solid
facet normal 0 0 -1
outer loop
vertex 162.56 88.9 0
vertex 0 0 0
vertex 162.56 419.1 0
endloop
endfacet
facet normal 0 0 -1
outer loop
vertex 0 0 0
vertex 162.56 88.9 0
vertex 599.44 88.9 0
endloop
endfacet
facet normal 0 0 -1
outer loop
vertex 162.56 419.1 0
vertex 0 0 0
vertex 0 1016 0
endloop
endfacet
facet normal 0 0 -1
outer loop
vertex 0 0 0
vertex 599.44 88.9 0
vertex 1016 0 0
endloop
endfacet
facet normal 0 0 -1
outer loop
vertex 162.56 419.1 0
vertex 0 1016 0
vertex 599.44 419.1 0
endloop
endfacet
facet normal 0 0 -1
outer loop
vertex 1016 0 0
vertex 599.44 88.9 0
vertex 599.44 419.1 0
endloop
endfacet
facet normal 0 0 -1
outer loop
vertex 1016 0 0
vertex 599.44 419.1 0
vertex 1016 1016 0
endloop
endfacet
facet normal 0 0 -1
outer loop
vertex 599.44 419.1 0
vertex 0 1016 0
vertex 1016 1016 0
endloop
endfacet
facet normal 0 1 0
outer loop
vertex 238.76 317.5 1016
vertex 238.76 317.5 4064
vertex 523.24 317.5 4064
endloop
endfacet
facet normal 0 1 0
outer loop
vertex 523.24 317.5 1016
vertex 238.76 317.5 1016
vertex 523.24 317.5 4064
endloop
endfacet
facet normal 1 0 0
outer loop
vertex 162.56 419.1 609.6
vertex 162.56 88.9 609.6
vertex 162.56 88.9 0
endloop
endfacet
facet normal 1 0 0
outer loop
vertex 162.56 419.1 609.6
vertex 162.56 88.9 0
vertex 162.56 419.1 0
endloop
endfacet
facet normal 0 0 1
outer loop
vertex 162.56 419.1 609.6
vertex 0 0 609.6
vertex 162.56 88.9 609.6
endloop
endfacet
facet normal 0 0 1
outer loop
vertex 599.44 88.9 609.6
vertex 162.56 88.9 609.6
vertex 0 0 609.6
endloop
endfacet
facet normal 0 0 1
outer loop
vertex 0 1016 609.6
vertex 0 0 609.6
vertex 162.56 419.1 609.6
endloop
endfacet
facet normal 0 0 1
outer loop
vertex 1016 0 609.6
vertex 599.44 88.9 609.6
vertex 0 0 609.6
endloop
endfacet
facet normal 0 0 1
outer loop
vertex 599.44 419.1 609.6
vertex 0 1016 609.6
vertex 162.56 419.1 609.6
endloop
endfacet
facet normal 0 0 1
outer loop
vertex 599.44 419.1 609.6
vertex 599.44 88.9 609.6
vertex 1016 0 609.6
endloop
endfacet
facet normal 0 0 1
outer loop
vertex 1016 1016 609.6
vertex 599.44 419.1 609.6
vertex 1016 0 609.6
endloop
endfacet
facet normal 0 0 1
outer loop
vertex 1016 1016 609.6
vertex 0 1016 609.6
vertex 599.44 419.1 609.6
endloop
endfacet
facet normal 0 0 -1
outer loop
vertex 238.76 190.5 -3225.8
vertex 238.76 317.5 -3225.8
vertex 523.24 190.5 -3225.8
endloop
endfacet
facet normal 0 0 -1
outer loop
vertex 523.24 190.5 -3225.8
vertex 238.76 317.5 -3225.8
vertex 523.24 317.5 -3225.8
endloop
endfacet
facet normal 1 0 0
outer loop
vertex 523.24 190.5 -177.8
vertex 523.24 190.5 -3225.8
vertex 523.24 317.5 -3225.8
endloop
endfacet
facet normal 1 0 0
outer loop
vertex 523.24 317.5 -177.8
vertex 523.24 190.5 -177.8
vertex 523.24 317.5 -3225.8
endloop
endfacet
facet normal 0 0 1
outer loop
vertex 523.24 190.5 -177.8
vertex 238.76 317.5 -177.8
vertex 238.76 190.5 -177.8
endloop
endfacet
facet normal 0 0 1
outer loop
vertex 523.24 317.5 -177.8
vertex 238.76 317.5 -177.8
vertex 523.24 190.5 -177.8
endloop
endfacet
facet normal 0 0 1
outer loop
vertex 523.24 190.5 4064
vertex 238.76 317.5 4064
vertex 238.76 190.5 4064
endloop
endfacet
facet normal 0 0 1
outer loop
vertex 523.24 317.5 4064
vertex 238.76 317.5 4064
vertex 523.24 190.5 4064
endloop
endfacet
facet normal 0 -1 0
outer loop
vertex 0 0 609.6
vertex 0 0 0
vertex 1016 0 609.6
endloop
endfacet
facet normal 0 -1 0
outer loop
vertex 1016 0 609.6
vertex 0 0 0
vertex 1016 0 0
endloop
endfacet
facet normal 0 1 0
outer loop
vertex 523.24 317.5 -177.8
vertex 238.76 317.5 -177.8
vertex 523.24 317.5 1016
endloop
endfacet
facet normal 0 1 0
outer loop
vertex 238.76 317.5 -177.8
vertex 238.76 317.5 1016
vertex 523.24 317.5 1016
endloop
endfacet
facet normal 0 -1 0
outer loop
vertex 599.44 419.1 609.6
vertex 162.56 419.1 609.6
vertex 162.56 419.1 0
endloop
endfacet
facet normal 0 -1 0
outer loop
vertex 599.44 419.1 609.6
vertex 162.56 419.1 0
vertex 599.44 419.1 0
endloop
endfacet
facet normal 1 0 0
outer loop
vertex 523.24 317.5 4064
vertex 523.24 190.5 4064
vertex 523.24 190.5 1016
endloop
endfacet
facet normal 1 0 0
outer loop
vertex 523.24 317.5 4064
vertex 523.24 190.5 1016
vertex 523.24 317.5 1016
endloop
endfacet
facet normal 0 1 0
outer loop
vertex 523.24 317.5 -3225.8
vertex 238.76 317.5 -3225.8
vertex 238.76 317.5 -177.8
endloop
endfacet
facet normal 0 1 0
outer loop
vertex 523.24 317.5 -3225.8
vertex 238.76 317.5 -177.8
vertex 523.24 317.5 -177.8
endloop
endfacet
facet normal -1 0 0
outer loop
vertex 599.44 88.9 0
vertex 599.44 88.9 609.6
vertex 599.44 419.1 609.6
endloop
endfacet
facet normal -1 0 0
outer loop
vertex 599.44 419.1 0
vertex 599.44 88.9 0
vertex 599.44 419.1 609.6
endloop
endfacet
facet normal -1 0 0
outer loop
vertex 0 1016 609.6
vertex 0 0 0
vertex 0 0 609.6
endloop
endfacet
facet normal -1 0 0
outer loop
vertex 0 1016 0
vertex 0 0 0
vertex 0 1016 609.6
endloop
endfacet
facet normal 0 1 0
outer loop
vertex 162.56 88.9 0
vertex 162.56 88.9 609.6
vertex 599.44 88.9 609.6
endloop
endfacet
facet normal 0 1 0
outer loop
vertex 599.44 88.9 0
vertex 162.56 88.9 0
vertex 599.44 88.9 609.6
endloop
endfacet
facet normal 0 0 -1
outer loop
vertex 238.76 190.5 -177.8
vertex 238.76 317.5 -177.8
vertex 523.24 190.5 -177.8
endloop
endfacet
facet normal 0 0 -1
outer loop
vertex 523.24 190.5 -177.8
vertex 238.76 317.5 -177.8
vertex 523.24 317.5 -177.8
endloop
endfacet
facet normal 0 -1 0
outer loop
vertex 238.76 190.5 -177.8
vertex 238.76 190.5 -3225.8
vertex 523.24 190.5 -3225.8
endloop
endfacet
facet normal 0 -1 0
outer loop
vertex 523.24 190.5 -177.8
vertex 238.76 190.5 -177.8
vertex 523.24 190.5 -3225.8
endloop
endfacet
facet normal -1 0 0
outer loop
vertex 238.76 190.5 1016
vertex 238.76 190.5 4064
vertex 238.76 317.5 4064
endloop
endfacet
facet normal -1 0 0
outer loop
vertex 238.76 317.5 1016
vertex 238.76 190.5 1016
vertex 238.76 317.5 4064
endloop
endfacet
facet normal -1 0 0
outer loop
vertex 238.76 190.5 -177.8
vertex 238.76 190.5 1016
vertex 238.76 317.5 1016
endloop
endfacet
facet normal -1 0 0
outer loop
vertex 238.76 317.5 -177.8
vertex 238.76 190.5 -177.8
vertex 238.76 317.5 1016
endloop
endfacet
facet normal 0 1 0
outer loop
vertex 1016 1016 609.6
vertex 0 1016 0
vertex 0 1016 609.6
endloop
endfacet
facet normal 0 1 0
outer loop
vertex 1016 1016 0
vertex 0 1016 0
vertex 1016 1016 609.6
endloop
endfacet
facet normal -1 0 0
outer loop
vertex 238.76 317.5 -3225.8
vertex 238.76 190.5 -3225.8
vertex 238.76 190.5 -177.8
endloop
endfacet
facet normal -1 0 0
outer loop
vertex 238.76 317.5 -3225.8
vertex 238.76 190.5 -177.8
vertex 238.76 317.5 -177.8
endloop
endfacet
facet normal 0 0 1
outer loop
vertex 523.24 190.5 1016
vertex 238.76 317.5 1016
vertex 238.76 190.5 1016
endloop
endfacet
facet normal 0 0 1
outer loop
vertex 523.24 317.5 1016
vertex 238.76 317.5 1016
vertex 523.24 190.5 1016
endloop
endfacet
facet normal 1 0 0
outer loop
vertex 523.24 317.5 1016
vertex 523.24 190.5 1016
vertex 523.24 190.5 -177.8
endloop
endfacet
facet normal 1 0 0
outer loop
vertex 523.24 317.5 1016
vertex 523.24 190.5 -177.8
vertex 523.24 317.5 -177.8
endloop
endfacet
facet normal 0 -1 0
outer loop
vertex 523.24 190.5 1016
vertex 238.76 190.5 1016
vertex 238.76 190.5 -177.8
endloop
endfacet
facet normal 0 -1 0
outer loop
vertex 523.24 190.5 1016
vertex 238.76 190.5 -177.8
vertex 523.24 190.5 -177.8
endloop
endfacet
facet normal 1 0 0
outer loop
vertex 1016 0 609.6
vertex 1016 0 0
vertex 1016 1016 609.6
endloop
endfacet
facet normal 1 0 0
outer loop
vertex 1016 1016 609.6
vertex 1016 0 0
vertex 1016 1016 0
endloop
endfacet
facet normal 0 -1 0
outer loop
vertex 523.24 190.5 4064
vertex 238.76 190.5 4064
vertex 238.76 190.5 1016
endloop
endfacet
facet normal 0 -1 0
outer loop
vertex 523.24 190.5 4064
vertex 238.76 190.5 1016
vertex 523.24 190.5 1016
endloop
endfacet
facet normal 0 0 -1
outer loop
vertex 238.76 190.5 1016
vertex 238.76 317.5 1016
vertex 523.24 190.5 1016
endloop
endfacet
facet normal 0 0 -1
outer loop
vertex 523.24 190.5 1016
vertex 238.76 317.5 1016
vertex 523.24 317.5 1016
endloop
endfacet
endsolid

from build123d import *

# Parameters (mm, degrees)
F0_W      = 1016
F0_H      = 1016
F1_DEPTH  = 609.6
F2_W      = 436.88
F2_H      = 330.2
F2_W_2    = 284.48
F2_H_2    = 127
F3_DEPTH  = 609.601
F4_DEPTH  = 762
F5_DEPTH  = 1168.4
F6_DEPTH  = 431.8
F7_DEPTH  = 1193.8
F8_DEPTH  = 406.4
F9_DEPTH  = 1320.8
F10_DEPTH = 177.8
F11_DEPTH = 3048
F12_DEPTH = 3048


with BuildPart() as f1:
    # F0 (on Top) → F1 (new body)
    with BuildSketch(Plane.XY):
        with Locations((508, 508)):
            Rectangle(F0_W, F0_H)
    extrude(amount=F1_DEPTH)

    # F2 (on face) → F3 (cut, through all)
    with BuildSketch(Plane.XY.offset(609.6)):
        with Locations((381, 254)):
            Rectangle(F2_W, F2_H)
        with Locations((381, 254)):
            Rectangle(F2_W_2, F2_H_2, mode=Mode.SUBTRACT)
        with Locations((381, 254)):
            Rectangle(F2_W_2, F2_H_2)
    extrude(amount=-F3_DEPTH, mode=Mode.SUBTRACT)


with BuildPart() as f4:
    # F2 (on face) → F4 (new body, symmetric)
    with BuildSketch(Plane.XY.offset(609.6)):
        with Locations((381, 254)):
            Rectangle(F2_W_2, F2_H_2)
    extrude(amount=F4_DEPTH, both=True)

    # F5 (add): a face of the model
    f5_faces = [f4.faces().sort_by_distance(p)[0] for p in [
        (381, 254, -152.4),
    ]]
    extrude(f5_faces, amount=F5_DEPTH)

    # F6 (add): a face of the model
    f6_faces = [f4.faces().sort_by_distance(p)[0] for p in [
        (381, 254, 1371.6),
    ]]
    extrude(f6_faces, amount=F6_DEPTH)

    # F7 (cut, through all): a face of the model
    f7_faces = [f4.faces().sort_by_distance(p)[0] for p in [
        (381, 254, 1803.4),
    ]]
    extrude(f7_faces, amount=-F7_DEPTH, mode=Mode.SUBTRACT)

    # F8 (add): a face of the model
    f8_faces = [f4.faces().sort_by_distance(p)[0] for p in [
        (381, 254, 609.6),
    ]]
    extrude(f8_faces, amount=F8_DEPTH)

    # F9 (cut, through all): a face of the model
    f9_faces = [f4.faces().sort_by_distance(p)[0] for p in [
        (381, 254, -1320.8),
    ]]
    extrude(f9_faces, amount=-F9_DEPTH, mode=Mode.SUBTRACT)

    # F10 (add): a face of the model
    f10_faces = [f4.faces().sort_by_distance(p)[0] for p in [
        (381, 254, 0),
    ]]
    extrude(f10_faces, amount=F10_DEPTH)


with BuildPart() as f11:
    # F11 (new): a face of the model
    f11_faces = [f4.part.faces().sort_by_distance(p)[0] for p in [
        (381, 254, 1016),
    ]]
    extrude(f11_faces, amount=F11_DEPTH)


with BuildPart() as f12:
    # F12 (new): a face of the model
    f12_faces = [f4.part.faces().sort_by_distance(p)[0] for p in [
        (381, 254, -177.8),
    ]]
    extrude(f12_faces, amount=F12_DEPTH)


solid = Compound([f1.part, f4.part, f11.part, f12.part])
